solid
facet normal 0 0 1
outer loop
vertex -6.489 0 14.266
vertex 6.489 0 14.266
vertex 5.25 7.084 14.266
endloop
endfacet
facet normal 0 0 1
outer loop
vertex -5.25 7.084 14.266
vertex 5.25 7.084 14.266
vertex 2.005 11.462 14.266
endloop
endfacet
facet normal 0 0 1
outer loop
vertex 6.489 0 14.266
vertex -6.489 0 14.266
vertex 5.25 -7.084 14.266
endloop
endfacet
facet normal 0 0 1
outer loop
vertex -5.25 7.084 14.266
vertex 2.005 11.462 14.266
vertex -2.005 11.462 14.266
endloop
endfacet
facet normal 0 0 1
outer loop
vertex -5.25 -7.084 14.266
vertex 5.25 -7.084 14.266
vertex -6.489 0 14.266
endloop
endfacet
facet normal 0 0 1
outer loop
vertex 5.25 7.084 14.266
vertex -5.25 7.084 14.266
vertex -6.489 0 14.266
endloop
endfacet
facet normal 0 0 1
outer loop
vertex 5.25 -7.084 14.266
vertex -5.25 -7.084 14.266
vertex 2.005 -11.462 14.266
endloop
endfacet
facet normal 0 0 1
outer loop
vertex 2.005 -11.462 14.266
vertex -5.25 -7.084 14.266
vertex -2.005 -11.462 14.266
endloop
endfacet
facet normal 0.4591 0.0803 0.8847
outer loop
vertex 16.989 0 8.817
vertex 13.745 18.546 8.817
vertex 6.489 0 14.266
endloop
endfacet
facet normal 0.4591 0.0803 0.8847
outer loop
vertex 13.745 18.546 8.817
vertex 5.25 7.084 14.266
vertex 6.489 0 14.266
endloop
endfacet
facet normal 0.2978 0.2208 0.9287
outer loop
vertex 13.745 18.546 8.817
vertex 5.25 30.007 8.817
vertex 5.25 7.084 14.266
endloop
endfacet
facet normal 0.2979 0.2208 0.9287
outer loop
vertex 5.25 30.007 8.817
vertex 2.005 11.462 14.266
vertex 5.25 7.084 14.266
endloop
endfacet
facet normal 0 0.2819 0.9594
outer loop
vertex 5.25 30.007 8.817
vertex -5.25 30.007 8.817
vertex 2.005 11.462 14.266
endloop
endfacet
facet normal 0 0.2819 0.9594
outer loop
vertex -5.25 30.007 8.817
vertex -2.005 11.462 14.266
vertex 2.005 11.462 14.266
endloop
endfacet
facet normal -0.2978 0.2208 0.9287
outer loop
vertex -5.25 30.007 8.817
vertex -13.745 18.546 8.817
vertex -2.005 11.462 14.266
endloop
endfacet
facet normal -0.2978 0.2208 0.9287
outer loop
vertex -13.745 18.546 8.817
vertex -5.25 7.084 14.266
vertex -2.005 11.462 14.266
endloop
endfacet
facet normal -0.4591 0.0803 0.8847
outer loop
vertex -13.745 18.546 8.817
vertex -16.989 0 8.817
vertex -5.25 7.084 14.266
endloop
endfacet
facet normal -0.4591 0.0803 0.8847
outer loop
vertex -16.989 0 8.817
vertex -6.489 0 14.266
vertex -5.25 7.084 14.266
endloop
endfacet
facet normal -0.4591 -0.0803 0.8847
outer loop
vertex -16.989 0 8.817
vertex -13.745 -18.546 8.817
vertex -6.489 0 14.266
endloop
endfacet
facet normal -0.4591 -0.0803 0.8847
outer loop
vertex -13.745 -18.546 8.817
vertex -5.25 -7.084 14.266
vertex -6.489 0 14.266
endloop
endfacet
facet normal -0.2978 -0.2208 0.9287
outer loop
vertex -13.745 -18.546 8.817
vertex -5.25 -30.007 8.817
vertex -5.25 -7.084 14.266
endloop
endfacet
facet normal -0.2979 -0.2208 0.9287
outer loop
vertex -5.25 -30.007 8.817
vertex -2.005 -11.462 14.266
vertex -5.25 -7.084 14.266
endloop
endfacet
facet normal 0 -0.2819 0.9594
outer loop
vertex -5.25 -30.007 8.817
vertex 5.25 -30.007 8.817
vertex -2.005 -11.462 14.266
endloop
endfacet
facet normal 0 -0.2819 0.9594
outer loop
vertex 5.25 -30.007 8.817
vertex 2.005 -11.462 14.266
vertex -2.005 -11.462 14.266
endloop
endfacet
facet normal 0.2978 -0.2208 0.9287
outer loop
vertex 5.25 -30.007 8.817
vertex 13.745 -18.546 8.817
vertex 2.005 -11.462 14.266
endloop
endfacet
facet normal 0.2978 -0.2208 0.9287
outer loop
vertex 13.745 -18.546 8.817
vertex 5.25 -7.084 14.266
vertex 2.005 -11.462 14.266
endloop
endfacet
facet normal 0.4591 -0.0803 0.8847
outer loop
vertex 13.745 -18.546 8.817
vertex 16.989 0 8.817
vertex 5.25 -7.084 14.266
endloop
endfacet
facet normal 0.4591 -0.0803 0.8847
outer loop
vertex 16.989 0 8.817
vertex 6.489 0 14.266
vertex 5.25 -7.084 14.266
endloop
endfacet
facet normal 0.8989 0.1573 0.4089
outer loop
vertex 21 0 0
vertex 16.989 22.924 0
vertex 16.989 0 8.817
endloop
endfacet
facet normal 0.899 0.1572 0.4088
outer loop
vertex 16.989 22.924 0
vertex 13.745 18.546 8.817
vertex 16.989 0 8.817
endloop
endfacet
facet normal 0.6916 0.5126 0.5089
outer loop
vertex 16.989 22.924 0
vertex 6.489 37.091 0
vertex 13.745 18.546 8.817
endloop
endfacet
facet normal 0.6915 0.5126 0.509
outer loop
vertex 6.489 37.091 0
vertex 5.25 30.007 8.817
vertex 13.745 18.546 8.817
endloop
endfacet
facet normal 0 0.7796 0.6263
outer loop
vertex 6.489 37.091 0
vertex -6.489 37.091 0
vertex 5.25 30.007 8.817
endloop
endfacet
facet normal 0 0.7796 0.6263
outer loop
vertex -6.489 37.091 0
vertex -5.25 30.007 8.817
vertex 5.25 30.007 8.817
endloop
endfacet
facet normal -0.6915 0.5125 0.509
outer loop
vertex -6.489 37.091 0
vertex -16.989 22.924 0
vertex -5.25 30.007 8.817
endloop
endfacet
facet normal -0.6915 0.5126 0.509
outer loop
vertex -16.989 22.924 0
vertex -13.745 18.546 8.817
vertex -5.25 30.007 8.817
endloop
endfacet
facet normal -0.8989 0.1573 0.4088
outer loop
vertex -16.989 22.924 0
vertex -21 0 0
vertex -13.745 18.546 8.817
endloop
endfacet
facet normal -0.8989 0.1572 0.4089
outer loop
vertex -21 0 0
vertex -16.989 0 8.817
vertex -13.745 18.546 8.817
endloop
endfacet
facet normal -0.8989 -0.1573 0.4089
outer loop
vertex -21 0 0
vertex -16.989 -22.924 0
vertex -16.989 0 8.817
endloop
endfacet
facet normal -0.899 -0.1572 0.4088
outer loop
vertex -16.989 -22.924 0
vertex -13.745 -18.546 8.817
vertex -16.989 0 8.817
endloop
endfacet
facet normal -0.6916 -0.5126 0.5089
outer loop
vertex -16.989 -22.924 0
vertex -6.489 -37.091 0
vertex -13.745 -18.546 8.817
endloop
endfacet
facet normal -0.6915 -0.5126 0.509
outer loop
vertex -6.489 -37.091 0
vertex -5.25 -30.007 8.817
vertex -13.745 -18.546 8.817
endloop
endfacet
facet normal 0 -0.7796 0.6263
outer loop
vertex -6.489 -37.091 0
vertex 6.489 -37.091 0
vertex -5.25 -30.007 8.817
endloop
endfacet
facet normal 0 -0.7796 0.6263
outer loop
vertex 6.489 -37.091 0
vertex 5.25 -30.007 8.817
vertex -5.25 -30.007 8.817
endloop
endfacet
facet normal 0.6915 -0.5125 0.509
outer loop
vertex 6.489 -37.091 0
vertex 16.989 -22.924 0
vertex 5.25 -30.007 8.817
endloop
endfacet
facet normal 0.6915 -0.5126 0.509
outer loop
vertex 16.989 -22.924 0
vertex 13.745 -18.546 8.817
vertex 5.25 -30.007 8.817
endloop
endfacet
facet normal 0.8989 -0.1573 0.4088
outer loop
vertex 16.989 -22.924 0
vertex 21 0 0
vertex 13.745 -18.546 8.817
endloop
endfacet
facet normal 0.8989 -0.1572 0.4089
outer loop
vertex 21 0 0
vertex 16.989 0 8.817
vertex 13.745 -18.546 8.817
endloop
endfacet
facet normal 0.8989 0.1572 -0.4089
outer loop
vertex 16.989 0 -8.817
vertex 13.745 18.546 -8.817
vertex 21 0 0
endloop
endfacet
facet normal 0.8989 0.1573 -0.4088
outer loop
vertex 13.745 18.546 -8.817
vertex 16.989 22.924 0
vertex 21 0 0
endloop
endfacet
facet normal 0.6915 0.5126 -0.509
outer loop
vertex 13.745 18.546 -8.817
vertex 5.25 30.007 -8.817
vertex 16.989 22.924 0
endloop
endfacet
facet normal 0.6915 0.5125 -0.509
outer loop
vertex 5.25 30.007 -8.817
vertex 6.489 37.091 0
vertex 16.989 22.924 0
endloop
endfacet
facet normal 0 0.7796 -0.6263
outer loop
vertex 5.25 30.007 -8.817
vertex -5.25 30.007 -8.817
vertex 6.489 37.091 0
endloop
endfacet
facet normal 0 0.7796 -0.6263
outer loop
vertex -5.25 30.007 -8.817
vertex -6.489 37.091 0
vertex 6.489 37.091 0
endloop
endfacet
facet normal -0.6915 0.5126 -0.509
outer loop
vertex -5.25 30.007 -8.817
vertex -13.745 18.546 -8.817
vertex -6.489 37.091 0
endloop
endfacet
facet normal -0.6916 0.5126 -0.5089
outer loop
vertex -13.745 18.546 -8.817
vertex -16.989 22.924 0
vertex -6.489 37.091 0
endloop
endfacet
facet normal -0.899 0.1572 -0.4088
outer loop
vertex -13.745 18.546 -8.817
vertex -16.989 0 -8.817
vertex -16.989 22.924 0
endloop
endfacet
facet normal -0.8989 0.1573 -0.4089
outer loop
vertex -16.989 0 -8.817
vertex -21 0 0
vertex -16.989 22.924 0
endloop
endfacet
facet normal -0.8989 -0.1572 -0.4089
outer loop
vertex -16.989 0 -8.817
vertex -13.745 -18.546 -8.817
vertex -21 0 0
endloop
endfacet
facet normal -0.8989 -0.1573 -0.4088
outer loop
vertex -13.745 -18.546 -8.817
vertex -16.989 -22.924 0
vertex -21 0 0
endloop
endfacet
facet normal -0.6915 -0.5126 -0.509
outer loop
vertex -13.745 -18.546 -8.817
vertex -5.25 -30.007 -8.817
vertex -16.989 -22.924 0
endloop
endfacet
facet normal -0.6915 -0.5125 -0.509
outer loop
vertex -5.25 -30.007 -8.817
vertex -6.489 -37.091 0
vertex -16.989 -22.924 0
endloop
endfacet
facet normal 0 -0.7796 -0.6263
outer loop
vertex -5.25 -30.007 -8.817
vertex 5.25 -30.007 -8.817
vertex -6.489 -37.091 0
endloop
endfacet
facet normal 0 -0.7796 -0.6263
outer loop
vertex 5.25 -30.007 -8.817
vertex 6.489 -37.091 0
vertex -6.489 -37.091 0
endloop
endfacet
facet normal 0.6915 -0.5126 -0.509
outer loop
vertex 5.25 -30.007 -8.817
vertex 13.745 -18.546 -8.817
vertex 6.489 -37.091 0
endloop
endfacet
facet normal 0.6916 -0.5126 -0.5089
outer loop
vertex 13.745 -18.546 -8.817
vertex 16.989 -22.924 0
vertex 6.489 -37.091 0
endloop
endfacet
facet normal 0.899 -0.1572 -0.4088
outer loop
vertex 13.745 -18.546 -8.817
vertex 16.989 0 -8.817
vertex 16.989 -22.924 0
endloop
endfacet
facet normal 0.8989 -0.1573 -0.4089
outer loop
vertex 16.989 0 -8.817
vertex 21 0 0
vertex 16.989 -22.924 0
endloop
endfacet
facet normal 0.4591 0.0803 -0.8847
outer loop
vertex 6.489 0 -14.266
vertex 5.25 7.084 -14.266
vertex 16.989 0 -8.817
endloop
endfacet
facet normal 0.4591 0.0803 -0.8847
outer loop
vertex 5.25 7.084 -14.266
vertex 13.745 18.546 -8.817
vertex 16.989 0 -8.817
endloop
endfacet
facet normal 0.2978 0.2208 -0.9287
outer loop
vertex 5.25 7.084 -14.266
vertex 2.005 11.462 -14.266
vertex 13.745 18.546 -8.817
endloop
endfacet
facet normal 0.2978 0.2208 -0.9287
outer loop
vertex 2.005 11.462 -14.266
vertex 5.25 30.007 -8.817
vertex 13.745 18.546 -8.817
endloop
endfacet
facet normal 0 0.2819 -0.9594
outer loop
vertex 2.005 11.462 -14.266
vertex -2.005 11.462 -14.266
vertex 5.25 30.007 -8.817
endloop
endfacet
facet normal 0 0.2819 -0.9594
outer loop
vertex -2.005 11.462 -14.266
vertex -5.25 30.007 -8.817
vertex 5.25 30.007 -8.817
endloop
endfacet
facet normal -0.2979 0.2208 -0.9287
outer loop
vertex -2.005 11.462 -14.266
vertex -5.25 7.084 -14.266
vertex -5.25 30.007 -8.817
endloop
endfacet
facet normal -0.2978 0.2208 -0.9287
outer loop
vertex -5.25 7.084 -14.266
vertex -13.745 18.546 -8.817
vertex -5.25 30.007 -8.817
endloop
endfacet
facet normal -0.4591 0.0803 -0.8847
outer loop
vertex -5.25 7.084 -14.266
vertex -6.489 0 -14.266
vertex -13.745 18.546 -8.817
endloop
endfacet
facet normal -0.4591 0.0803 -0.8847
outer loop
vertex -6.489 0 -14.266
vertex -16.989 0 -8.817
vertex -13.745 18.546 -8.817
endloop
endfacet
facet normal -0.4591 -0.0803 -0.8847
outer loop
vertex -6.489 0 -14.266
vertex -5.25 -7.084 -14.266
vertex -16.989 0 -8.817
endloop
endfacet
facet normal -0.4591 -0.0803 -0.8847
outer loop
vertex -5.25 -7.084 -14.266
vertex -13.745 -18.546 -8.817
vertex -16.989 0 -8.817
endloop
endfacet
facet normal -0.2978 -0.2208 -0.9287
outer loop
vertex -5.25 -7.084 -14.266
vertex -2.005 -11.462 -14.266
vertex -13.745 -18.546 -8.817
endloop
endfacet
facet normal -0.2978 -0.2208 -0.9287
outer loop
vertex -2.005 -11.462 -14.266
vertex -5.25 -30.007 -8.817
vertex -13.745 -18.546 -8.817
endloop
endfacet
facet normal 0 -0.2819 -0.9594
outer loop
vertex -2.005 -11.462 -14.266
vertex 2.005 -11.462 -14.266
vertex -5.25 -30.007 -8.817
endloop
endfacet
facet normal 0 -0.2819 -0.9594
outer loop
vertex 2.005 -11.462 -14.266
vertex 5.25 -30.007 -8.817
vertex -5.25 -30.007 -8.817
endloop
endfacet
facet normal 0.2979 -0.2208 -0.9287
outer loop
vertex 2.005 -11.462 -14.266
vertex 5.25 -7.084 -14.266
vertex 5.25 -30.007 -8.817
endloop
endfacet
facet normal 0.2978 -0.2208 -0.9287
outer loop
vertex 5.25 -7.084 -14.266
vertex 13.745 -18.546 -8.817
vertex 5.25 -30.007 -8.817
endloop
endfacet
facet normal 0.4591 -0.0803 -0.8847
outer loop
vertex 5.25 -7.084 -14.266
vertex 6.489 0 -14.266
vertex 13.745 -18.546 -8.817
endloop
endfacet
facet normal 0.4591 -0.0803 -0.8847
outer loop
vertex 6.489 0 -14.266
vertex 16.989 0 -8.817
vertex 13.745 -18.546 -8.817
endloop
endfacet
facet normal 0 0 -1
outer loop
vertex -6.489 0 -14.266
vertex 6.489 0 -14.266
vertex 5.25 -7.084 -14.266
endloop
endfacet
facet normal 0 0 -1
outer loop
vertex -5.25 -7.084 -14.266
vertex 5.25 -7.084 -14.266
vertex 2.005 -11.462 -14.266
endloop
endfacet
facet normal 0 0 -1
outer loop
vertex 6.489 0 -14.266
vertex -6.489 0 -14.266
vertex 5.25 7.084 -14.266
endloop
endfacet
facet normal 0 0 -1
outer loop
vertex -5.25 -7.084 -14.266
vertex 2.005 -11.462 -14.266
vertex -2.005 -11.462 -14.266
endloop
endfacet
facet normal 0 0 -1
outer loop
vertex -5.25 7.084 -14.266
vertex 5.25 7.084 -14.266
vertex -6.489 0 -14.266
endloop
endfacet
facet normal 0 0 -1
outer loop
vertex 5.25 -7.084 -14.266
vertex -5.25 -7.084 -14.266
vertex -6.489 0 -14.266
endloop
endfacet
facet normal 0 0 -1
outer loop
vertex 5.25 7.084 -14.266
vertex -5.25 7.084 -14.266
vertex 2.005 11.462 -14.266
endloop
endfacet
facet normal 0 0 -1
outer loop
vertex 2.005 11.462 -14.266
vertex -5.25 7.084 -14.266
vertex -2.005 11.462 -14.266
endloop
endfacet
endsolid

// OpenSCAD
// Generated by SolidPython 1.0.1 on 2020-07-29 00:46:47


scale(v = [7, 13, 5]) {
	sphere(r = 3);
}
/***********************************************
*********      SolidPython code:      **********
************************************************
 
# import packages: SolidPython
from solid import *
from solid.utils import *
from itertools import chain, combinations, permutations


class Resize:

    def __init__(self, scad_file):
        self.scad_file = scad_file
        #self.scad_file = import_scad(scad_file)
        # cone/cylinder param:
        self.r1 = 0
        self.r2 = 0
        self.h = 0
        # rectangular prism param:
        self.w = 0
        self.l = 0
        # ellipse param:
        self.r = 0

    # import OpenScad code (file name corresponds to shape)


    # classify shape + parameters
    def assign(self, param1, param2, param3):
        if self.scad_file == 'cone.scad':
            self.r1 = param1
            self.r2 = param2
            self.h = param3
        elif self.scad_file == 'cylinder.scad':
            self.r1 = param1
            self.r2 = param2
            self.h = param3
        elif self.scad_file == 'rectangularPrism.scad':
            self.h = param1
            self.l = param2
            self.w = param3
        else:
            self.r = param1
            self.h = param2

    # resize parameters
    def iterate(self):
        x = range(3, 20, 2)
        i = 1
        if self.scad_file == 'cone.scad':
            tempList = list(permutations(x, 2))
            for temp in tempList:
                param1 = temp[0]
                param2 = temp[1]
                filepath = 'produced_scad_files/' + 'cone' + str(param1) + '_' + str(param2) + '_' + '.scad'
                scad_render_to_file(cylinder(h=param1, r1=param2, r2=0), filepath)

        elif self.scad_file == 'cylinder.scad':
            tempList = list(permutations(x, 3))
            for temp in tempList:
                param1 = temp[0]
                param2 = temp[1]
                filepath = 'produced_scad_files/' + 'cylinder' + str(param1) + '_' + str(param2) + '_' + '.scad'
                scad_render_to_file(cylinder(h=param1, r1=param2, r2=param2), filepath)

        elif self.scad_file == 'rectangularPrism.scad':
            tempList = list(permutations(x, 3))
            for temp in tempList:
                param1 = temp[0]
                param2 = temp[1]
                param3 = temp[2]
                filepath = 'produced_scad_files/' + 'rectangularPrism' + str(param1) + '_' + str(param2) + '_' + str(
                    param3) + '.scad'
                scad_render_to_file(cube(size=(param1, param2, param3)), filepath)

        elif self.scad_file == 'ellipse.scad':
            tempList = list(permutations(x, 4))
            for temp in tempList:
                param1 = temp[0]
                param2 = temp[1]
                param3 = temp[2]
                param4 = temp[3]
                filepath = 'produced_scad_files/' + 'ellipse' + str(param1) + '_' + str(param2) + '_' + str(param3) + '_' + str(param4) + '.scad'
                scad_render_to_file(scale([param1, param2, param3])(sphere(r=param4)), filepath)

    def render_to_scadfile(self):
        scad_render_to_file(scad, 'example.scad') 
 
************************************************/
